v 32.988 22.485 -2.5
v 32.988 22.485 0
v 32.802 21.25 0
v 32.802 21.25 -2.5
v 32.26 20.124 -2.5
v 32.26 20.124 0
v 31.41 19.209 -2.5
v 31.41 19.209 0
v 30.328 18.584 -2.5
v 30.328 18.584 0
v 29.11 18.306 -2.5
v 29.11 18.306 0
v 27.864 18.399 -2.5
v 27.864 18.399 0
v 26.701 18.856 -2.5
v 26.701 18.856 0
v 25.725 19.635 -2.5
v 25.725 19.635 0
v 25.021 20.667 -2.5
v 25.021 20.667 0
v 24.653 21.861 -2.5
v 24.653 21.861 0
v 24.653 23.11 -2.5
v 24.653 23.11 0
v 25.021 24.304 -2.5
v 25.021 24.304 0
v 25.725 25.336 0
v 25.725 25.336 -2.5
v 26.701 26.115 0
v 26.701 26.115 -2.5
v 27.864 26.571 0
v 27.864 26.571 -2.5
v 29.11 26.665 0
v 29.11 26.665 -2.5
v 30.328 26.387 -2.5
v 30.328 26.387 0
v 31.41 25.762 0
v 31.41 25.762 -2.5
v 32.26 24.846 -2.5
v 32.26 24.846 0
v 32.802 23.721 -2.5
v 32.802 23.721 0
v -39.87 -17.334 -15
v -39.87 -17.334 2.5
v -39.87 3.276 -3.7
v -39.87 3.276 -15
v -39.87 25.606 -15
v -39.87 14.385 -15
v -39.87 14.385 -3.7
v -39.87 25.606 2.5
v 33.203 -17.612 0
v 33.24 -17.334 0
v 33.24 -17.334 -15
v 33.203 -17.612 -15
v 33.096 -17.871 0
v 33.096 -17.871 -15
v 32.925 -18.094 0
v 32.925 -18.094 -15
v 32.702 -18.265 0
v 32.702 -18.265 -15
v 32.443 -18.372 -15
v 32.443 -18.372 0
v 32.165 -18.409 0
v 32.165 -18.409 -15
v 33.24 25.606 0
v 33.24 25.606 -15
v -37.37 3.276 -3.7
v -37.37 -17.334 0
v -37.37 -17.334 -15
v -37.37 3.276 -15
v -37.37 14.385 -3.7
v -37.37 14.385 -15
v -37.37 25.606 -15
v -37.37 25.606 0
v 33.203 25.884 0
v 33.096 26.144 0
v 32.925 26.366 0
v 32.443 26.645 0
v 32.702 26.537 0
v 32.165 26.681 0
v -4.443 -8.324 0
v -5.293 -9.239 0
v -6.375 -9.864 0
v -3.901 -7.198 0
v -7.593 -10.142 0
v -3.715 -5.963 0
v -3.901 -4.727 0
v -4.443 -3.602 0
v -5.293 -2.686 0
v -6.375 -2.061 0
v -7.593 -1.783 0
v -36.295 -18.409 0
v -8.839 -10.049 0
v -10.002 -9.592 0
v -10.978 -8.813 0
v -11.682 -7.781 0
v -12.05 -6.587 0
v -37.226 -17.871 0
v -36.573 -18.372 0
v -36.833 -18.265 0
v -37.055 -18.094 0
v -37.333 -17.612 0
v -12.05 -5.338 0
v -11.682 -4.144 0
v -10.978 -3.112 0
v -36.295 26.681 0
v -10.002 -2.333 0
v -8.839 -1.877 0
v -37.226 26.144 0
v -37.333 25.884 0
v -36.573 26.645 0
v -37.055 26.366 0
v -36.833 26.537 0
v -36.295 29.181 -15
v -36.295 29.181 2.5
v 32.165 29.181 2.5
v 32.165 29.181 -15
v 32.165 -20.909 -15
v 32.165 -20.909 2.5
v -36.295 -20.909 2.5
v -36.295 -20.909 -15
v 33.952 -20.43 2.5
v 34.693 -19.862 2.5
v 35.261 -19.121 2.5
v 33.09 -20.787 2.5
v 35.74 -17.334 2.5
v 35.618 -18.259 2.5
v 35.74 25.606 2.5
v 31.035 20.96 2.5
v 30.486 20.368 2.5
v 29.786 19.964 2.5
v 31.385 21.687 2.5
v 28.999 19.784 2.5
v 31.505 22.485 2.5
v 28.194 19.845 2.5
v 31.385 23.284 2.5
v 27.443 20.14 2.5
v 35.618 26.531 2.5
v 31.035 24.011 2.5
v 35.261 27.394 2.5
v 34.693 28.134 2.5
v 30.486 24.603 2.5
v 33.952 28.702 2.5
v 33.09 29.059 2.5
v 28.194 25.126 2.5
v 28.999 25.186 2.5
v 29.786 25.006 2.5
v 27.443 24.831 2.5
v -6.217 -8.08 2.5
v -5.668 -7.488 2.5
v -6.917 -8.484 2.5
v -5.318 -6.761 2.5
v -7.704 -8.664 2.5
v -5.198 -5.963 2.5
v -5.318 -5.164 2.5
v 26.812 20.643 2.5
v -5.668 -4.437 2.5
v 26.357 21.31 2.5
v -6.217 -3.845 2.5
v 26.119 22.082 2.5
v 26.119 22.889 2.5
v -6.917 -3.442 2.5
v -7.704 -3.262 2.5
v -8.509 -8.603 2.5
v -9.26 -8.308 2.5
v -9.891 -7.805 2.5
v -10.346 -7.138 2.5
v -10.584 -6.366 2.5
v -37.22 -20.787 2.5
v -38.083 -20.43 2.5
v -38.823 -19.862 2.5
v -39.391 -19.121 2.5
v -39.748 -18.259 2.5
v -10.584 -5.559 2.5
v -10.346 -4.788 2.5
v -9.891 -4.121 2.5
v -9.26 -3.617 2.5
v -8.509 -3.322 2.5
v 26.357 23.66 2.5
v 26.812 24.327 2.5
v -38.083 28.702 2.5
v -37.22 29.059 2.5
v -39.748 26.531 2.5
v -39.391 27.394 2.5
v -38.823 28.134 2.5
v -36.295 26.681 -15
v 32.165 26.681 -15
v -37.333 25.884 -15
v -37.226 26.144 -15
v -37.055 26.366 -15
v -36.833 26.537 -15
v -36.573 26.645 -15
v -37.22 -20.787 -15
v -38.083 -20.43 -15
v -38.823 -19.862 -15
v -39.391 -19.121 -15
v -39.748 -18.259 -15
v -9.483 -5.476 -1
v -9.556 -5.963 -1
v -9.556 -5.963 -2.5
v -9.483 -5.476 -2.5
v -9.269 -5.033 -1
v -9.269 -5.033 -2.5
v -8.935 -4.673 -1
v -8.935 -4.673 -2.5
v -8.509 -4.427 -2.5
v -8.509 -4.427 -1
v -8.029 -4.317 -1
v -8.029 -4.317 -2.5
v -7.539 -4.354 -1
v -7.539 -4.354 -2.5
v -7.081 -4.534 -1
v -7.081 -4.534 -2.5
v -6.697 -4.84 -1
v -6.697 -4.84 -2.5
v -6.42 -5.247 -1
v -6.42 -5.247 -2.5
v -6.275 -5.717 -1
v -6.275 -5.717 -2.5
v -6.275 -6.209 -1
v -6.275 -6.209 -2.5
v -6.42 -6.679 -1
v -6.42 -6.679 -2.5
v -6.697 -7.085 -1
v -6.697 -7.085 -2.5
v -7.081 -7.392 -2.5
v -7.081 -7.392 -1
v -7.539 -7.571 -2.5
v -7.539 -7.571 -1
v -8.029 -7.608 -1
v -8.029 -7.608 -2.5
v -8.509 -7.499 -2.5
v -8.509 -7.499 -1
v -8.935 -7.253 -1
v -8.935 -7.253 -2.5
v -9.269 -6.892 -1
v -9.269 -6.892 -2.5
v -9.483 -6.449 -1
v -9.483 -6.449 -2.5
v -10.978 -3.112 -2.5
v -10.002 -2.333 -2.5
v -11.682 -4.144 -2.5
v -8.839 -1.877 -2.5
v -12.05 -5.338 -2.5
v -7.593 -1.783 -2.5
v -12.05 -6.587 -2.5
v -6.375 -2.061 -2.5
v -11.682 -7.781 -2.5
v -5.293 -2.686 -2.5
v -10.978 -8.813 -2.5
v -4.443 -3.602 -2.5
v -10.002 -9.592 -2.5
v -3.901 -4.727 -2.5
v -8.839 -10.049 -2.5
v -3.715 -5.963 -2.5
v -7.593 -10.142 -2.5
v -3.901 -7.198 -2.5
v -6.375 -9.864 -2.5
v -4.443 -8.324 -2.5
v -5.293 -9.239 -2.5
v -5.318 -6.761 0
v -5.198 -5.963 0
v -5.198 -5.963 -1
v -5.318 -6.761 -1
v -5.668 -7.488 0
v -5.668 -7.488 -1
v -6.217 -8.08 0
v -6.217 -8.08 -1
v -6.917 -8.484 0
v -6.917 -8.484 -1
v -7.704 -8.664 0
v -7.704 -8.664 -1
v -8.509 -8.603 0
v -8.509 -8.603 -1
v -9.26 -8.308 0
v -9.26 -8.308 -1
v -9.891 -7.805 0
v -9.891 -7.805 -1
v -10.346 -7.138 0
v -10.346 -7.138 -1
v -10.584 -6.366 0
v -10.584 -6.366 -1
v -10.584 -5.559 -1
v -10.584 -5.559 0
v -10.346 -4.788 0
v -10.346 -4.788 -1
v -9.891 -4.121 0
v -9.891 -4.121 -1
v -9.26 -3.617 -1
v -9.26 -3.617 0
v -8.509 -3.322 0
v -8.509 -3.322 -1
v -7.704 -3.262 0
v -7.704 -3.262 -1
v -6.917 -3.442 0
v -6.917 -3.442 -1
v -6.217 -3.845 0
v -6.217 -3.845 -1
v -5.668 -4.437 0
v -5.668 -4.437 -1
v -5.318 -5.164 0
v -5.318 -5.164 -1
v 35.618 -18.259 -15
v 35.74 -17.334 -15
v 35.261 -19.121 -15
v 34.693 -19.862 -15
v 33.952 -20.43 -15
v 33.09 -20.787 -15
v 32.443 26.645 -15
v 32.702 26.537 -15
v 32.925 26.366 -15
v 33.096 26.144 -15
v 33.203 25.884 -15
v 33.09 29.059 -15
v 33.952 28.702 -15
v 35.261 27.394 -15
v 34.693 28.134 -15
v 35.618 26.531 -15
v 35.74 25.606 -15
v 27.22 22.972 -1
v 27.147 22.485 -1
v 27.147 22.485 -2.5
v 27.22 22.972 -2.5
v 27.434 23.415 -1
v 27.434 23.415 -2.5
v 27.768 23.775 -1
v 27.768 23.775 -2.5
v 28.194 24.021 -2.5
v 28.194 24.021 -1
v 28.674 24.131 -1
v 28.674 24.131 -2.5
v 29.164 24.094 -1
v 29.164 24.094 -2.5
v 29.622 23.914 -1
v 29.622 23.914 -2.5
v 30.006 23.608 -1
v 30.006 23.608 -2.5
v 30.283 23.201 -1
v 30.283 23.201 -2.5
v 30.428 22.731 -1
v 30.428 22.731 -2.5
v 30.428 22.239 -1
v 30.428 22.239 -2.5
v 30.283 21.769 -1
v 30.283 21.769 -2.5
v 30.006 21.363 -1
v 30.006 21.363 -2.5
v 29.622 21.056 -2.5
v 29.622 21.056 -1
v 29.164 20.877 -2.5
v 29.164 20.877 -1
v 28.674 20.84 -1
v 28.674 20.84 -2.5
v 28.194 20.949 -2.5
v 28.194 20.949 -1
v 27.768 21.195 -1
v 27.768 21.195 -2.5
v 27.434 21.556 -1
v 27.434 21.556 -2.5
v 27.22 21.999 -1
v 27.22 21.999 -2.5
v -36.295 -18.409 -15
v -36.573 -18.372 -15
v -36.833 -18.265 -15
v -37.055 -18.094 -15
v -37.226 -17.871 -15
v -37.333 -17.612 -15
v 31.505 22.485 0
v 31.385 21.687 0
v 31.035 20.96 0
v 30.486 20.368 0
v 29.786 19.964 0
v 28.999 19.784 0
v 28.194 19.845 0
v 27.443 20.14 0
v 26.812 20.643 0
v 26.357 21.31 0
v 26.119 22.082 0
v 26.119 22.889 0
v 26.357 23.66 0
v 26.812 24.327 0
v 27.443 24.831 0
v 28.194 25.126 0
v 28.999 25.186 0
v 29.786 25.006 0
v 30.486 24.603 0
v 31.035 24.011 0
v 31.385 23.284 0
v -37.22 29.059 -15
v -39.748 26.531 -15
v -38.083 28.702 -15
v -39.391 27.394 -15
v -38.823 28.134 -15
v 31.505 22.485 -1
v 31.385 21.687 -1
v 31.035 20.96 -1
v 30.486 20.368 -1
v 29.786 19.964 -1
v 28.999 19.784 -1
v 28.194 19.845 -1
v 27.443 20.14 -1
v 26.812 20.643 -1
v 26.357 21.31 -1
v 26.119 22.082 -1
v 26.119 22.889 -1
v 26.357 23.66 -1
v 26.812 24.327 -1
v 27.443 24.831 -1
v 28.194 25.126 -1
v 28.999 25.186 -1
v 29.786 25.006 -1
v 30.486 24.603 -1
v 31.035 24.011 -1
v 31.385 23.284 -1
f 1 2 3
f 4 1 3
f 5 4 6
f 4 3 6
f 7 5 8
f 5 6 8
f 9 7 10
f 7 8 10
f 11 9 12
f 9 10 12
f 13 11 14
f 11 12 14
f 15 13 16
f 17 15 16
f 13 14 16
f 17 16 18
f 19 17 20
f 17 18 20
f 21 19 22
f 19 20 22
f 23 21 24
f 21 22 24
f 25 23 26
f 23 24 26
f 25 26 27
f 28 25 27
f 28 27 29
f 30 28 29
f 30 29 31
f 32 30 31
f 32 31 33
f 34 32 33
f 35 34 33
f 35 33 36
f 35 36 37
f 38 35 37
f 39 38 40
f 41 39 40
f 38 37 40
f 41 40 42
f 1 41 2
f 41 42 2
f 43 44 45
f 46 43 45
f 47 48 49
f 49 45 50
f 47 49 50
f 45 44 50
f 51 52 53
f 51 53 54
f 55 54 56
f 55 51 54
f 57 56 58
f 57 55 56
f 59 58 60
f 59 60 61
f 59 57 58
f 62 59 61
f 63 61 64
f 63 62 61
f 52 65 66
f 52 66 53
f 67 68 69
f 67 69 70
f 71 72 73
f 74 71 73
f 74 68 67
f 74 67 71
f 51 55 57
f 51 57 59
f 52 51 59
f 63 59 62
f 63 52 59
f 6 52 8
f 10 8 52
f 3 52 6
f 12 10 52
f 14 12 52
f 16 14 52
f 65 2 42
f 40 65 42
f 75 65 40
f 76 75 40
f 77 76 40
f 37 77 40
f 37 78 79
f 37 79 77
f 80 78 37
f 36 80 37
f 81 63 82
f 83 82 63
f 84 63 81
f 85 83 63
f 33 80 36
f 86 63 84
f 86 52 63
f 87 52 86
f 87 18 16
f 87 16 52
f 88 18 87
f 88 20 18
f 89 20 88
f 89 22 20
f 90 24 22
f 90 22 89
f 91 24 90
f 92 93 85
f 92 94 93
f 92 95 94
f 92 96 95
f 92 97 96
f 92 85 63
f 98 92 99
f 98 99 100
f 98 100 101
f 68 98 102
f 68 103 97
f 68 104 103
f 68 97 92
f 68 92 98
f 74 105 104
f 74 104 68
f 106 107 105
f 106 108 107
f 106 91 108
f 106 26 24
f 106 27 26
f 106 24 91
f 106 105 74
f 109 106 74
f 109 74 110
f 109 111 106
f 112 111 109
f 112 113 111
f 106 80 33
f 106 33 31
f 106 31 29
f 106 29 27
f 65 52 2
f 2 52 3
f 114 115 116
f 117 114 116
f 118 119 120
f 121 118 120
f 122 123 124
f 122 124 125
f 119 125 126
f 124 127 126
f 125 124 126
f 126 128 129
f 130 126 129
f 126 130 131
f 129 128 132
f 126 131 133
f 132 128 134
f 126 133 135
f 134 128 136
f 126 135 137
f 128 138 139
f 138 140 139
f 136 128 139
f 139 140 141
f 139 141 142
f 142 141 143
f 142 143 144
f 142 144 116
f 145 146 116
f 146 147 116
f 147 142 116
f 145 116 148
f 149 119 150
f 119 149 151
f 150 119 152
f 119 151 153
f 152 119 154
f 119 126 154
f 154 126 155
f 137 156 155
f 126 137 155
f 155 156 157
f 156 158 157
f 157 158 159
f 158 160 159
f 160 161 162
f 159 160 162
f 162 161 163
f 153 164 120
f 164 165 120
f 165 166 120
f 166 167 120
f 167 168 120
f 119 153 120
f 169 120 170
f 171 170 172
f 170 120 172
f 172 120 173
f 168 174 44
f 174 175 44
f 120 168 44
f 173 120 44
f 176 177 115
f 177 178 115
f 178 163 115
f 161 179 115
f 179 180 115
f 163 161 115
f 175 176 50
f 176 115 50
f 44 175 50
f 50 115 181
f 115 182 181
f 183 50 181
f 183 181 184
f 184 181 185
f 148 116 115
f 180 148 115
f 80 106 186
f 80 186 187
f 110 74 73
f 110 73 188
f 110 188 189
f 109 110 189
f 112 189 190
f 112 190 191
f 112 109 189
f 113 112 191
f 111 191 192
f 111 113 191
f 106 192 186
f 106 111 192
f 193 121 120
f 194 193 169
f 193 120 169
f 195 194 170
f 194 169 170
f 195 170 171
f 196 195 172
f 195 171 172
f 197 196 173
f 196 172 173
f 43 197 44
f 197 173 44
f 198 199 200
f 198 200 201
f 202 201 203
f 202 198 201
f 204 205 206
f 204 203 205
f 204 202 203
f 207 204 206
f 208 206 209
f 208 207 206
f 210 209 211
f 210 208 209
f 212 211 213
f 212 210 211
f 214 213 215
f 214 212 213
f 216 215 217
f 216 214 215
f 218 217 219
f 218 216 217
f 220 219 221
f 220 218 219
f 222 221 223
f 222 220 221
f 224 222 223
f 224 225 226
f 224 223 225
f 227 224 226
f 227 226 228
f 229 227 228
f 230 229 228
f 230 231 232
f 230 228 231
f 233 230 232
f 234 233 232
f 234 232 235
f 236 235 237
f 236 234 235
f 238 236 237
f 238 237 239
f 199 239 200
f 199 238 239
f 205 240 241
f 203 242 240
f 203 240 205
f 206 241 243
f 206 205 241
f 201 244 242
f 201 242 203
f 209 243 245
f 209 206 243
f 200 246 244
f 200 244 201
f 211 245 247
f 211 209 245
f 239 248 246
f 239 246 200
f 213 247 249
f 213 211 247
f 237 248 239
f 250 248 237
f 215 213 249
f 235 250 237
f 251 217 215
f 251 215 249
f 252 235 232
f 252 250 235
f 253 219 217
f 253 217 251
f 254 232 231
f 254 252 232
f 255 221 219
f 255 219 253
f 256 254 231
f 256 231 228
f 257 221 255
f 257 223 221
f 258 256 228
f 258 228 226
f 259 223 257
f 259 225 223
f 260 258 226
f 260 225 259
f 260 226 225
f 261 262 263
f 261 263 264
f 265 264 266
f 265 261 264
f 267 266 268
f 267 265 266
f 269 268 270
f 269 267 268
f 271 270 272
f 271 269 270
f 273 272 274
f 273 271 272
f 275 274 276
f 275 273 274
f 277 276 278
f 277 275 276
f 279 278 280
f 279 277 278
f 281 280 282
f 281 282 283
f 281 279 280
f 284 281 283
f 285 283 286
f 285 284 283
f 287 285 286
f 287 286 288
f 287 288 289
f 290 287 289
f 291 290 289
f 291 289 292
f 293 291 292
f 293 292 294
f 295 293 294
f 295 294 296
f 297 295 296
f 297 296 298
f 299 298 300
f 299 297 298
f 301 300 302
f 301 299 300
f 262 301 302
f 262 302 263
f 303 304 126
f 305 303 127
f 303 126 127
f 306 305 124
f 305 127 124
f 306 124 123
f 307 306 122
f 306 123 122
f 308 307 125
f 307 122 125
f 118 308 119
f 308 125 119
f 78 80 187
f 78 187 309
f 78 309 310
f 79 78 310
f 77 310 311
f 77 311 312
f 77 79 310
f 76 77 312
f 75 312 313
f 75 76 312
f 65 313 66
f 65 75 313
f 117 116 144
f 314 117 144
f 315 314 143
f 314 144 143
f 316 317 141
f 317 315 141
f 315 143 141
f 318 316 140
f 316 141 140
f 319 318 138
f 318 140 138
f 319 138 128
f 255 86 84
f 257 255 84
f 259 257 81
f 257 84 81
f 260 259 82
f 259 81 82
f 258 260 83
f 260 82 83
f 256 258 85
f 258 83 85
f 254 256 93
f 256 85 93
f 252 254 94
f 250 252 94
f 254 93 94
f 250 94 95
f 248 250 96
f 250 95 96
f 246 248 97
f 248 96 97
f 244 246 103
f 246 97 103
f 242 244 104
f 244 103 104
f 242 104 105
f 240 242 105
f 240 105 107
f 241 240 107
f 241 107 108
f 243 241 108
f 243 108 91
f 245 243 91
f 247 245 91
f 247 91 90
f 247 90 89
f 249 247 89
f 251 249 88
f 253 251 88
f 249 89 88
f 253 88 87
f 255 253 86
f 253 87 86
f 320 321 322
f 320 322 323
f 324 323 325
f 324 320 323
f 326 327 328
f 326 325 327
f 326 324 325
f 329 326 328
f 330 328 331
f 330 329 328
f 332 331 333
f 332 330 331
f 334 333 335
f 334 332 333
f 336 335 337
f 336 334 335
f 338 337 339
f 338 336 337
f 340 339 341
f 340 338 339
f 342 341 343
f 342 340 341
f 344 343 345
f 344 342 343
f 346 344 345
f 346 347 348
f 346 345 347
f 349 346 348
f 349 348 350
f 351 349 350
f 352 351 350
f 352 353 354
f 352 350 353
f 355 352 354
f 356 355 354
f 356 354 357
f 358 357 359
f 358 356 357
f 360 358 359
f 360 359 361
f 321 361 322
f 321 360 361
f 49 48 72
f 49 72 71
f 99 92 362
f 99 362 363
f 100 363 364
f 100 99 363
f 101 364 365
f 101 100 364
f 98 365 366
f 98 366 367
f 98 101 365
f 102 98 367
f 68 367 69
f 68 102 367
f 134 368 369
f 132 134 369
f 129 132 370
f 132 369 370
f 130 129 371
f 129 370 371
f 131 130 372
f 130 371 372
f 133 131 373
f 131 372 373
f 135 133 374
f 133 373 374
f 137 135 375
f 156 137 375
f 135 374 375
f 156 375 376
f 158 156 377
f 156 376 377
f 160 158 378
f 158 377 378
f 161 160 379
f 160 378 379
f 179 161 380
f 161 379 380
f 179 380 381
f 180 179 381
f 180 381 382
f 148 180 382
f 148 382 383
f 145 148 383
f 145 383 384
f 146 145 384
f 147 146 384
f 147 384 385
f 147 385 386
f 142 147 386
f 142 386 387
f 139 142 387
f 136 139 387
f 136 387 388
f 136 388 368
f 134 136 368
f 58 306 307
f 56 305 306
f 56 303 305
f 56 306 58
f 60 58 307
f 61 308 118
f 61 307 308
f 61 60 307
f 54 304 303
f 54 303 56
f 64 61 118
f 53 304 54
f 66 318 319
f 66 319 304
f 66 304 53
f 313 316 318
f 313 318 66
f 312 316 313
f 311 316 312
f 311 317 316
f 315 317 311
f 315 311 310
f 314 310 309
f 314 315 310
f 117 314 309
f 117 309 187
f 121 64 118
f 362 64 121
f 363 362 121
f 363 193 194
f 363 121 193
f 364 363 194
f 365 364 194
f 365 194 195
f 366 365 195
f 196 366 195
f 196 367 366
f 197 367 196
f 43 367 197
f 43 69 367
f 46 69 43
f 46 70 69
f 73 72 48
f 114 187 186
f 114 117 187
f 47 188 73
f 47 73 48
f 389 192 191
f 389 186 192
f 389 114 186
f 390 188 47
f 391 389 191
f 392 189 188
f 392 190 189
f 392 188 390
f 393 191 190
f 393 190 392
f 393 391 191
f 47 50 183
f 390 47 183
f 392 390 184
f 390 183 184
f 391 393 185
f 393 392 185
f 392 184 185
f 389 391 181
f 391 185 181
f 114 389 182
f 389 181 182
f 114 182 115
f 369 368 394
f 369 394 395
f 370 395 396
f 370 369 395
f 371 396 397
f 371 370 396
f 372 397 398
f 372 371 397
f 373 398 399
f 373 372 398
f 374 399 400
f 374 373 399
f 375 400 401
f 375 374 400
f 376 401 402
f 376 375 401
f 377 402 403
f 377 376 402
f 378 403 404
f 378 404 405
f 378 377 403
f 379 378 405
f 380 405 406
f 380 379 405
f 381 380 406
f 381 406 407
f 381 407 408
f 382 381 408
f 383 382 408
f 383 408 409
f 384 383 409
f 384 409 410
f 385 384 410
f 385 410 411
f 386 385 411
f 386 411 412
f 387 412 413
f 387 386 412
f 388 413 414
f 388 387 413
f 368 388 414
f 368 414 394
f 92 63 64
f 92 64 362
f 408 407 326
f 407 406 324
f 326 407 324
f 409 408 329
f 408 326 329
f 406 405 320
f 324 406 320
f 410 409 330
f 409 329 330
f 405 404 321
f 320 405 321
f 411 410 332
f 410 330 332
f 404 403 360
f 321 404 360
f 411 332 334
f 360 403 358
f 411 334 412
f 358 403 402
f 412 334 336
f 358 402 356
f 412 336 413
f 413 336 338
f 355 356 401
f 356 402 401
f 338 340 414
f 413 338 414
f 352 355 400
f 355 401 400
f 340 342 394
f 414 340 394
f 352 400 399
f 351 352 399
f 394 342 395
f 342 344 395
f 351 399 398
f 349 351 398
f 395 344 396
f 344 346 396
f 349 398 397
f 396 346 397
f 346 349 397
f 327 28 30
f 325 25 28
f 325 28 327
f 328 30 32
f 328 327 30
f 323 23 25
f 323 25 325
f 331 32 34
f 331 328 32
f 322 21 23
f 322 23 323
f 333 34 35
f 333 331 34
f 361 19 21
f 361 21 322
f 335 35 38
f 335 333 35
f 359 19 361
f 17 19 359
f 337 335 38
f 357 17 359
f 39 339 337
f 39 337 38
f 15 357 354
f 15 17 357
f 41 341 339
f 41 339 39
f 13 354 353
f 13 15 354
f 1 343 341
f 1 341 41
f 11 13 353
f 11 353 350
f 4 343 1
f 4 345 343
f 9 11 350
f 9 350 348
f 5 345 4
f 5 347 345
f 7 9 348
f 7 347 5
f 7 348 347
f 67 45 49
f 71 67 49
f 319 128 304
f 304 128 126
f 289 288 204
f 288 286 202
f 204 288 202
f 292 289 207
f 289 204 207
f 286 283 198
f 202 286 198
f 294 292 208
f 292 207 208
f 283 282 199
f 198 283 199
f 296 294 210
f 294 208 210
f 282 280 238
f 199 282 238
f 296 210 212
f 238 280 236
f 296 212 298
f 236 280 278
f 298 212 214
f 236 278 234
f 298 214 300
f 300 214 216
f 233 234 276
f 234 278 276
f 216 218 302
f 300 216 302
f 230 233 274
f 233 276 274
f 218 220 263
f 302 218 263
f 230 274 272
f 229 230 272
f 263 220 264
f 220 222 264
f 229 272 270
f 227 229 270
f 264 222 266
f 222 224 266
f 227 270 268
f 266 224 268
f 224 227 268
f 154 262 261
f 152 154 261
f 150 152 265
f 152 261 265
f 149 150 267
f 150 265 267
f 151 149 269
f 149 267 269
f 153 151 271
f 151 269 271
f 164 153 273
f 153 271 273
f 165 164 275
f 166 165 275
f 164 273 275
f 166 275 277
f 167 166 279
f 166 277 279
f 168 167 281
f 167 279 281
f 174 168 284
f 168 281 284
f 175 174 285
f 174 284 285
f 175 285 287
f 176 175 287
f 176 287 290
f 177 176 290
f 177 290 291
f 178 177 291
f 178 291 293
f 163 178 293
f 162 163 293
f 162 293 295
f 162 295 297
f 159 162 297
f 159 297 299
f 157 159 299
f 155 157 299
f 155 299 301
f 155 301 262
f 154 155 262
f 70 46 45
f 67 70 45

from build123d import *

# Parameters (mm, degrees)
EXTRUDE_1_DEPTH                 = 15
SHELL_1_T                       = 2.5
SKETCH_5_R                      = 4.191
EXTRUDE_2_DEPTH                 = 2.5
CUT_EXTRUDE_1_REACH             = 53.635
SKETCH_6_R                      = 2.7083489
CUT_EXTRUDE_1_DIRECTION_2_DEPTH = 1
CUT_EXTRUDE_2_DEPTH             = 52.634942496
CUT_EXTRUDE_2_DEPTH_BACK        = 52.634942496
SKETCH_7_R                      = 1.65
SKETCH_8_W                      = 11.3
SKETCH_8_H                      = 11.108258221
CUT_EXTRUDE_3_DEPTH             = 3


with BuildPart() as part:
    # 草图4 → 凸台-拉伸1 (new body)
    with BuildSketch(Plane.XY):
        with BuildLine():
            Line((32.164875784, -18.408833444), (-36.295124216, -18.408833444))
            ThreePointArc((-36.295124216, -18.408833444), (-37.055264006, -18.093973234), (-37.370124216, -17.333833444))
            Line((-37.370124216, -17.333833444), (-37.370124216, 25.606166556))
            ThreePointArc((-37.370124216, 25.606166556), (-37.055264006, 26.366306345), (-36.295124216, 26.681166556))
            Line((-36.295124216, 26.681166556), (32.164875784, 26.681166556))
            ThreePointArc((32.164875784, 26.681166556), (32.925015574, 26.366306345), (33.239875784, 25.606166556))
            Line((33.239875784, 25.606166556), (33.239875784, -17.333833444))
            ThreePointArc((33.239875784, -17.333833444), (32.925015574, -18.093973234), (32.164875784, -18.408833444))
        make_face()
    extrude(amount=-EXTRUDE_1_DEPTH)

    # 抽壳1
    shell_1_openings = [part.faces().sort_by_distance(p)[0] for p in [
        (-2.065124216, 4.136166556, -15),
    ]]
    offset(amount=SHELL_1_T, openings=shell_1_openings, kind=Kind.INTERSECTION)

    # 草图5 → 凸台-拉伸2 (add)
    with BuildSketch(Plane(origin=(0, 0, 0), x_dir=(-1, 0, 0), z_dir=(0, 0, -1))):
        with Locations(Location((-28.796875784, 22.485238556, 0), (0, 0, 180))):
            Circle(SKETCH_5_R)
        with Locations(Location((7.906124216, -5.962761444, 0), (0, 0, 180))):
            Circle(SKETCH_5_R)
    extrude(amount=EXTRUDE_2_DEPTH)

    # 草图6 → 切除-拉伸1 (cut, up to next)
    with BuildSketch(Plane(origin=(0, 0, 0), x_dir=(-1, 0, 0), z_dir=(0, 0, -1)), mode=Mode.PRIVATE) as cut_extrude_1_sk1:
        with Locations(Location((7.906124216, -5.962761444, 0), (0, 0, 180))):
            Circle(SKETCH_6_R)
    cut_extrude_1_tool1 = extrude(cut_extrude_1_sk1.sketch, amount=-CUT_EXTRUDE_1_REACH, mode=Mode.PRIVATE) & part.part
    # 草图6 → 切除-拉伸1 (cut, up to next)
    with BuildSketch(Plane(origin=(0, 0, 0), x_dir=(-1, 0, 0), z_dir=(0, 0, -1)), mode=Mode.PRIVATE) as cut_extrude_1_sk2:
        with Locations(Location((-28.796875784, 22.485238556, 0), (0, 0, 180))):
            Circle(SKETCH_6_R)
    cut_extrude_1_tool2 = extrude(cut_extrude_1_sk2.sketch, amount=-CUT_EXTRUDE_1_REACH, mode=Mode.PRIVATE) & part.part
    add(cut_extrude_1_tool1.solids().sort_by_distance((-7.906124, -5.962761, 0))[0], mode=Mode.SUBTRACT)
    add(cut_extrude_1_tool2.solids().sort_by_distance((28.796876, 22.485239, 0))[0], mode=Mode.SUBTRACT)

    # 草图6 → 切除-拉伸1 direction 2 (cut)
    with BuildSketch(Plane(origin=(0, 0, 0), x_dir=(-1, 0, 0), z_dir=(0, 0, -1))):
        with Locations(Location((7.906124216, -5.962761444, 0), (0, 0, 180))):
            Circle(SKETCH_6_R)
        with Locations(Location((-28.796875784, 22.485238556, 0), (0, 0, 180))):
            Circle(SKETCH_6_R)
    extrude(amount=CUT_EXTRUDE_1_DIRECTION_2_DEPTH, mode=Mode.SUBTRACT)

    # 草图7 → 切除-拉伸2 (cut, two sides: drawn at the far end of the back side and taken through both)
    with BuildSketch(Plane(origin=(0, 0, 0), x_dir=(-1, 0, 0), z_dir=(0, 0, -1)).offset(-CUT_EXTRUDE_2_DEPTH_BACK)):
        with Locations((7.906124216, -5.962761444)):
            Circle(SKETCH_7_R)
        with Locations((-28.796875784, 22.485238556)):
            Circle(SKETCH_7_R)
    extrude(amount=CUT_EXTRUDE_2_DEPTH + CUT_EXTRUDE_2_DEPTH_BACK, mode=Mode.SUBTRACT)

    # 草图8 → 切除-拉伸3 (cut)
    with BuildSketch(Plane.ZY.offset(39.870124216)):
        with Locations((-9.35, 8.830545142)):
            Rectangle(SKETCH_8_W, SKETCH_8_H)
    extrude(amount=-CUT_EXTRUDE_3_DEPTH, mode=Mode.SUBTRACT)


solid = part.part
